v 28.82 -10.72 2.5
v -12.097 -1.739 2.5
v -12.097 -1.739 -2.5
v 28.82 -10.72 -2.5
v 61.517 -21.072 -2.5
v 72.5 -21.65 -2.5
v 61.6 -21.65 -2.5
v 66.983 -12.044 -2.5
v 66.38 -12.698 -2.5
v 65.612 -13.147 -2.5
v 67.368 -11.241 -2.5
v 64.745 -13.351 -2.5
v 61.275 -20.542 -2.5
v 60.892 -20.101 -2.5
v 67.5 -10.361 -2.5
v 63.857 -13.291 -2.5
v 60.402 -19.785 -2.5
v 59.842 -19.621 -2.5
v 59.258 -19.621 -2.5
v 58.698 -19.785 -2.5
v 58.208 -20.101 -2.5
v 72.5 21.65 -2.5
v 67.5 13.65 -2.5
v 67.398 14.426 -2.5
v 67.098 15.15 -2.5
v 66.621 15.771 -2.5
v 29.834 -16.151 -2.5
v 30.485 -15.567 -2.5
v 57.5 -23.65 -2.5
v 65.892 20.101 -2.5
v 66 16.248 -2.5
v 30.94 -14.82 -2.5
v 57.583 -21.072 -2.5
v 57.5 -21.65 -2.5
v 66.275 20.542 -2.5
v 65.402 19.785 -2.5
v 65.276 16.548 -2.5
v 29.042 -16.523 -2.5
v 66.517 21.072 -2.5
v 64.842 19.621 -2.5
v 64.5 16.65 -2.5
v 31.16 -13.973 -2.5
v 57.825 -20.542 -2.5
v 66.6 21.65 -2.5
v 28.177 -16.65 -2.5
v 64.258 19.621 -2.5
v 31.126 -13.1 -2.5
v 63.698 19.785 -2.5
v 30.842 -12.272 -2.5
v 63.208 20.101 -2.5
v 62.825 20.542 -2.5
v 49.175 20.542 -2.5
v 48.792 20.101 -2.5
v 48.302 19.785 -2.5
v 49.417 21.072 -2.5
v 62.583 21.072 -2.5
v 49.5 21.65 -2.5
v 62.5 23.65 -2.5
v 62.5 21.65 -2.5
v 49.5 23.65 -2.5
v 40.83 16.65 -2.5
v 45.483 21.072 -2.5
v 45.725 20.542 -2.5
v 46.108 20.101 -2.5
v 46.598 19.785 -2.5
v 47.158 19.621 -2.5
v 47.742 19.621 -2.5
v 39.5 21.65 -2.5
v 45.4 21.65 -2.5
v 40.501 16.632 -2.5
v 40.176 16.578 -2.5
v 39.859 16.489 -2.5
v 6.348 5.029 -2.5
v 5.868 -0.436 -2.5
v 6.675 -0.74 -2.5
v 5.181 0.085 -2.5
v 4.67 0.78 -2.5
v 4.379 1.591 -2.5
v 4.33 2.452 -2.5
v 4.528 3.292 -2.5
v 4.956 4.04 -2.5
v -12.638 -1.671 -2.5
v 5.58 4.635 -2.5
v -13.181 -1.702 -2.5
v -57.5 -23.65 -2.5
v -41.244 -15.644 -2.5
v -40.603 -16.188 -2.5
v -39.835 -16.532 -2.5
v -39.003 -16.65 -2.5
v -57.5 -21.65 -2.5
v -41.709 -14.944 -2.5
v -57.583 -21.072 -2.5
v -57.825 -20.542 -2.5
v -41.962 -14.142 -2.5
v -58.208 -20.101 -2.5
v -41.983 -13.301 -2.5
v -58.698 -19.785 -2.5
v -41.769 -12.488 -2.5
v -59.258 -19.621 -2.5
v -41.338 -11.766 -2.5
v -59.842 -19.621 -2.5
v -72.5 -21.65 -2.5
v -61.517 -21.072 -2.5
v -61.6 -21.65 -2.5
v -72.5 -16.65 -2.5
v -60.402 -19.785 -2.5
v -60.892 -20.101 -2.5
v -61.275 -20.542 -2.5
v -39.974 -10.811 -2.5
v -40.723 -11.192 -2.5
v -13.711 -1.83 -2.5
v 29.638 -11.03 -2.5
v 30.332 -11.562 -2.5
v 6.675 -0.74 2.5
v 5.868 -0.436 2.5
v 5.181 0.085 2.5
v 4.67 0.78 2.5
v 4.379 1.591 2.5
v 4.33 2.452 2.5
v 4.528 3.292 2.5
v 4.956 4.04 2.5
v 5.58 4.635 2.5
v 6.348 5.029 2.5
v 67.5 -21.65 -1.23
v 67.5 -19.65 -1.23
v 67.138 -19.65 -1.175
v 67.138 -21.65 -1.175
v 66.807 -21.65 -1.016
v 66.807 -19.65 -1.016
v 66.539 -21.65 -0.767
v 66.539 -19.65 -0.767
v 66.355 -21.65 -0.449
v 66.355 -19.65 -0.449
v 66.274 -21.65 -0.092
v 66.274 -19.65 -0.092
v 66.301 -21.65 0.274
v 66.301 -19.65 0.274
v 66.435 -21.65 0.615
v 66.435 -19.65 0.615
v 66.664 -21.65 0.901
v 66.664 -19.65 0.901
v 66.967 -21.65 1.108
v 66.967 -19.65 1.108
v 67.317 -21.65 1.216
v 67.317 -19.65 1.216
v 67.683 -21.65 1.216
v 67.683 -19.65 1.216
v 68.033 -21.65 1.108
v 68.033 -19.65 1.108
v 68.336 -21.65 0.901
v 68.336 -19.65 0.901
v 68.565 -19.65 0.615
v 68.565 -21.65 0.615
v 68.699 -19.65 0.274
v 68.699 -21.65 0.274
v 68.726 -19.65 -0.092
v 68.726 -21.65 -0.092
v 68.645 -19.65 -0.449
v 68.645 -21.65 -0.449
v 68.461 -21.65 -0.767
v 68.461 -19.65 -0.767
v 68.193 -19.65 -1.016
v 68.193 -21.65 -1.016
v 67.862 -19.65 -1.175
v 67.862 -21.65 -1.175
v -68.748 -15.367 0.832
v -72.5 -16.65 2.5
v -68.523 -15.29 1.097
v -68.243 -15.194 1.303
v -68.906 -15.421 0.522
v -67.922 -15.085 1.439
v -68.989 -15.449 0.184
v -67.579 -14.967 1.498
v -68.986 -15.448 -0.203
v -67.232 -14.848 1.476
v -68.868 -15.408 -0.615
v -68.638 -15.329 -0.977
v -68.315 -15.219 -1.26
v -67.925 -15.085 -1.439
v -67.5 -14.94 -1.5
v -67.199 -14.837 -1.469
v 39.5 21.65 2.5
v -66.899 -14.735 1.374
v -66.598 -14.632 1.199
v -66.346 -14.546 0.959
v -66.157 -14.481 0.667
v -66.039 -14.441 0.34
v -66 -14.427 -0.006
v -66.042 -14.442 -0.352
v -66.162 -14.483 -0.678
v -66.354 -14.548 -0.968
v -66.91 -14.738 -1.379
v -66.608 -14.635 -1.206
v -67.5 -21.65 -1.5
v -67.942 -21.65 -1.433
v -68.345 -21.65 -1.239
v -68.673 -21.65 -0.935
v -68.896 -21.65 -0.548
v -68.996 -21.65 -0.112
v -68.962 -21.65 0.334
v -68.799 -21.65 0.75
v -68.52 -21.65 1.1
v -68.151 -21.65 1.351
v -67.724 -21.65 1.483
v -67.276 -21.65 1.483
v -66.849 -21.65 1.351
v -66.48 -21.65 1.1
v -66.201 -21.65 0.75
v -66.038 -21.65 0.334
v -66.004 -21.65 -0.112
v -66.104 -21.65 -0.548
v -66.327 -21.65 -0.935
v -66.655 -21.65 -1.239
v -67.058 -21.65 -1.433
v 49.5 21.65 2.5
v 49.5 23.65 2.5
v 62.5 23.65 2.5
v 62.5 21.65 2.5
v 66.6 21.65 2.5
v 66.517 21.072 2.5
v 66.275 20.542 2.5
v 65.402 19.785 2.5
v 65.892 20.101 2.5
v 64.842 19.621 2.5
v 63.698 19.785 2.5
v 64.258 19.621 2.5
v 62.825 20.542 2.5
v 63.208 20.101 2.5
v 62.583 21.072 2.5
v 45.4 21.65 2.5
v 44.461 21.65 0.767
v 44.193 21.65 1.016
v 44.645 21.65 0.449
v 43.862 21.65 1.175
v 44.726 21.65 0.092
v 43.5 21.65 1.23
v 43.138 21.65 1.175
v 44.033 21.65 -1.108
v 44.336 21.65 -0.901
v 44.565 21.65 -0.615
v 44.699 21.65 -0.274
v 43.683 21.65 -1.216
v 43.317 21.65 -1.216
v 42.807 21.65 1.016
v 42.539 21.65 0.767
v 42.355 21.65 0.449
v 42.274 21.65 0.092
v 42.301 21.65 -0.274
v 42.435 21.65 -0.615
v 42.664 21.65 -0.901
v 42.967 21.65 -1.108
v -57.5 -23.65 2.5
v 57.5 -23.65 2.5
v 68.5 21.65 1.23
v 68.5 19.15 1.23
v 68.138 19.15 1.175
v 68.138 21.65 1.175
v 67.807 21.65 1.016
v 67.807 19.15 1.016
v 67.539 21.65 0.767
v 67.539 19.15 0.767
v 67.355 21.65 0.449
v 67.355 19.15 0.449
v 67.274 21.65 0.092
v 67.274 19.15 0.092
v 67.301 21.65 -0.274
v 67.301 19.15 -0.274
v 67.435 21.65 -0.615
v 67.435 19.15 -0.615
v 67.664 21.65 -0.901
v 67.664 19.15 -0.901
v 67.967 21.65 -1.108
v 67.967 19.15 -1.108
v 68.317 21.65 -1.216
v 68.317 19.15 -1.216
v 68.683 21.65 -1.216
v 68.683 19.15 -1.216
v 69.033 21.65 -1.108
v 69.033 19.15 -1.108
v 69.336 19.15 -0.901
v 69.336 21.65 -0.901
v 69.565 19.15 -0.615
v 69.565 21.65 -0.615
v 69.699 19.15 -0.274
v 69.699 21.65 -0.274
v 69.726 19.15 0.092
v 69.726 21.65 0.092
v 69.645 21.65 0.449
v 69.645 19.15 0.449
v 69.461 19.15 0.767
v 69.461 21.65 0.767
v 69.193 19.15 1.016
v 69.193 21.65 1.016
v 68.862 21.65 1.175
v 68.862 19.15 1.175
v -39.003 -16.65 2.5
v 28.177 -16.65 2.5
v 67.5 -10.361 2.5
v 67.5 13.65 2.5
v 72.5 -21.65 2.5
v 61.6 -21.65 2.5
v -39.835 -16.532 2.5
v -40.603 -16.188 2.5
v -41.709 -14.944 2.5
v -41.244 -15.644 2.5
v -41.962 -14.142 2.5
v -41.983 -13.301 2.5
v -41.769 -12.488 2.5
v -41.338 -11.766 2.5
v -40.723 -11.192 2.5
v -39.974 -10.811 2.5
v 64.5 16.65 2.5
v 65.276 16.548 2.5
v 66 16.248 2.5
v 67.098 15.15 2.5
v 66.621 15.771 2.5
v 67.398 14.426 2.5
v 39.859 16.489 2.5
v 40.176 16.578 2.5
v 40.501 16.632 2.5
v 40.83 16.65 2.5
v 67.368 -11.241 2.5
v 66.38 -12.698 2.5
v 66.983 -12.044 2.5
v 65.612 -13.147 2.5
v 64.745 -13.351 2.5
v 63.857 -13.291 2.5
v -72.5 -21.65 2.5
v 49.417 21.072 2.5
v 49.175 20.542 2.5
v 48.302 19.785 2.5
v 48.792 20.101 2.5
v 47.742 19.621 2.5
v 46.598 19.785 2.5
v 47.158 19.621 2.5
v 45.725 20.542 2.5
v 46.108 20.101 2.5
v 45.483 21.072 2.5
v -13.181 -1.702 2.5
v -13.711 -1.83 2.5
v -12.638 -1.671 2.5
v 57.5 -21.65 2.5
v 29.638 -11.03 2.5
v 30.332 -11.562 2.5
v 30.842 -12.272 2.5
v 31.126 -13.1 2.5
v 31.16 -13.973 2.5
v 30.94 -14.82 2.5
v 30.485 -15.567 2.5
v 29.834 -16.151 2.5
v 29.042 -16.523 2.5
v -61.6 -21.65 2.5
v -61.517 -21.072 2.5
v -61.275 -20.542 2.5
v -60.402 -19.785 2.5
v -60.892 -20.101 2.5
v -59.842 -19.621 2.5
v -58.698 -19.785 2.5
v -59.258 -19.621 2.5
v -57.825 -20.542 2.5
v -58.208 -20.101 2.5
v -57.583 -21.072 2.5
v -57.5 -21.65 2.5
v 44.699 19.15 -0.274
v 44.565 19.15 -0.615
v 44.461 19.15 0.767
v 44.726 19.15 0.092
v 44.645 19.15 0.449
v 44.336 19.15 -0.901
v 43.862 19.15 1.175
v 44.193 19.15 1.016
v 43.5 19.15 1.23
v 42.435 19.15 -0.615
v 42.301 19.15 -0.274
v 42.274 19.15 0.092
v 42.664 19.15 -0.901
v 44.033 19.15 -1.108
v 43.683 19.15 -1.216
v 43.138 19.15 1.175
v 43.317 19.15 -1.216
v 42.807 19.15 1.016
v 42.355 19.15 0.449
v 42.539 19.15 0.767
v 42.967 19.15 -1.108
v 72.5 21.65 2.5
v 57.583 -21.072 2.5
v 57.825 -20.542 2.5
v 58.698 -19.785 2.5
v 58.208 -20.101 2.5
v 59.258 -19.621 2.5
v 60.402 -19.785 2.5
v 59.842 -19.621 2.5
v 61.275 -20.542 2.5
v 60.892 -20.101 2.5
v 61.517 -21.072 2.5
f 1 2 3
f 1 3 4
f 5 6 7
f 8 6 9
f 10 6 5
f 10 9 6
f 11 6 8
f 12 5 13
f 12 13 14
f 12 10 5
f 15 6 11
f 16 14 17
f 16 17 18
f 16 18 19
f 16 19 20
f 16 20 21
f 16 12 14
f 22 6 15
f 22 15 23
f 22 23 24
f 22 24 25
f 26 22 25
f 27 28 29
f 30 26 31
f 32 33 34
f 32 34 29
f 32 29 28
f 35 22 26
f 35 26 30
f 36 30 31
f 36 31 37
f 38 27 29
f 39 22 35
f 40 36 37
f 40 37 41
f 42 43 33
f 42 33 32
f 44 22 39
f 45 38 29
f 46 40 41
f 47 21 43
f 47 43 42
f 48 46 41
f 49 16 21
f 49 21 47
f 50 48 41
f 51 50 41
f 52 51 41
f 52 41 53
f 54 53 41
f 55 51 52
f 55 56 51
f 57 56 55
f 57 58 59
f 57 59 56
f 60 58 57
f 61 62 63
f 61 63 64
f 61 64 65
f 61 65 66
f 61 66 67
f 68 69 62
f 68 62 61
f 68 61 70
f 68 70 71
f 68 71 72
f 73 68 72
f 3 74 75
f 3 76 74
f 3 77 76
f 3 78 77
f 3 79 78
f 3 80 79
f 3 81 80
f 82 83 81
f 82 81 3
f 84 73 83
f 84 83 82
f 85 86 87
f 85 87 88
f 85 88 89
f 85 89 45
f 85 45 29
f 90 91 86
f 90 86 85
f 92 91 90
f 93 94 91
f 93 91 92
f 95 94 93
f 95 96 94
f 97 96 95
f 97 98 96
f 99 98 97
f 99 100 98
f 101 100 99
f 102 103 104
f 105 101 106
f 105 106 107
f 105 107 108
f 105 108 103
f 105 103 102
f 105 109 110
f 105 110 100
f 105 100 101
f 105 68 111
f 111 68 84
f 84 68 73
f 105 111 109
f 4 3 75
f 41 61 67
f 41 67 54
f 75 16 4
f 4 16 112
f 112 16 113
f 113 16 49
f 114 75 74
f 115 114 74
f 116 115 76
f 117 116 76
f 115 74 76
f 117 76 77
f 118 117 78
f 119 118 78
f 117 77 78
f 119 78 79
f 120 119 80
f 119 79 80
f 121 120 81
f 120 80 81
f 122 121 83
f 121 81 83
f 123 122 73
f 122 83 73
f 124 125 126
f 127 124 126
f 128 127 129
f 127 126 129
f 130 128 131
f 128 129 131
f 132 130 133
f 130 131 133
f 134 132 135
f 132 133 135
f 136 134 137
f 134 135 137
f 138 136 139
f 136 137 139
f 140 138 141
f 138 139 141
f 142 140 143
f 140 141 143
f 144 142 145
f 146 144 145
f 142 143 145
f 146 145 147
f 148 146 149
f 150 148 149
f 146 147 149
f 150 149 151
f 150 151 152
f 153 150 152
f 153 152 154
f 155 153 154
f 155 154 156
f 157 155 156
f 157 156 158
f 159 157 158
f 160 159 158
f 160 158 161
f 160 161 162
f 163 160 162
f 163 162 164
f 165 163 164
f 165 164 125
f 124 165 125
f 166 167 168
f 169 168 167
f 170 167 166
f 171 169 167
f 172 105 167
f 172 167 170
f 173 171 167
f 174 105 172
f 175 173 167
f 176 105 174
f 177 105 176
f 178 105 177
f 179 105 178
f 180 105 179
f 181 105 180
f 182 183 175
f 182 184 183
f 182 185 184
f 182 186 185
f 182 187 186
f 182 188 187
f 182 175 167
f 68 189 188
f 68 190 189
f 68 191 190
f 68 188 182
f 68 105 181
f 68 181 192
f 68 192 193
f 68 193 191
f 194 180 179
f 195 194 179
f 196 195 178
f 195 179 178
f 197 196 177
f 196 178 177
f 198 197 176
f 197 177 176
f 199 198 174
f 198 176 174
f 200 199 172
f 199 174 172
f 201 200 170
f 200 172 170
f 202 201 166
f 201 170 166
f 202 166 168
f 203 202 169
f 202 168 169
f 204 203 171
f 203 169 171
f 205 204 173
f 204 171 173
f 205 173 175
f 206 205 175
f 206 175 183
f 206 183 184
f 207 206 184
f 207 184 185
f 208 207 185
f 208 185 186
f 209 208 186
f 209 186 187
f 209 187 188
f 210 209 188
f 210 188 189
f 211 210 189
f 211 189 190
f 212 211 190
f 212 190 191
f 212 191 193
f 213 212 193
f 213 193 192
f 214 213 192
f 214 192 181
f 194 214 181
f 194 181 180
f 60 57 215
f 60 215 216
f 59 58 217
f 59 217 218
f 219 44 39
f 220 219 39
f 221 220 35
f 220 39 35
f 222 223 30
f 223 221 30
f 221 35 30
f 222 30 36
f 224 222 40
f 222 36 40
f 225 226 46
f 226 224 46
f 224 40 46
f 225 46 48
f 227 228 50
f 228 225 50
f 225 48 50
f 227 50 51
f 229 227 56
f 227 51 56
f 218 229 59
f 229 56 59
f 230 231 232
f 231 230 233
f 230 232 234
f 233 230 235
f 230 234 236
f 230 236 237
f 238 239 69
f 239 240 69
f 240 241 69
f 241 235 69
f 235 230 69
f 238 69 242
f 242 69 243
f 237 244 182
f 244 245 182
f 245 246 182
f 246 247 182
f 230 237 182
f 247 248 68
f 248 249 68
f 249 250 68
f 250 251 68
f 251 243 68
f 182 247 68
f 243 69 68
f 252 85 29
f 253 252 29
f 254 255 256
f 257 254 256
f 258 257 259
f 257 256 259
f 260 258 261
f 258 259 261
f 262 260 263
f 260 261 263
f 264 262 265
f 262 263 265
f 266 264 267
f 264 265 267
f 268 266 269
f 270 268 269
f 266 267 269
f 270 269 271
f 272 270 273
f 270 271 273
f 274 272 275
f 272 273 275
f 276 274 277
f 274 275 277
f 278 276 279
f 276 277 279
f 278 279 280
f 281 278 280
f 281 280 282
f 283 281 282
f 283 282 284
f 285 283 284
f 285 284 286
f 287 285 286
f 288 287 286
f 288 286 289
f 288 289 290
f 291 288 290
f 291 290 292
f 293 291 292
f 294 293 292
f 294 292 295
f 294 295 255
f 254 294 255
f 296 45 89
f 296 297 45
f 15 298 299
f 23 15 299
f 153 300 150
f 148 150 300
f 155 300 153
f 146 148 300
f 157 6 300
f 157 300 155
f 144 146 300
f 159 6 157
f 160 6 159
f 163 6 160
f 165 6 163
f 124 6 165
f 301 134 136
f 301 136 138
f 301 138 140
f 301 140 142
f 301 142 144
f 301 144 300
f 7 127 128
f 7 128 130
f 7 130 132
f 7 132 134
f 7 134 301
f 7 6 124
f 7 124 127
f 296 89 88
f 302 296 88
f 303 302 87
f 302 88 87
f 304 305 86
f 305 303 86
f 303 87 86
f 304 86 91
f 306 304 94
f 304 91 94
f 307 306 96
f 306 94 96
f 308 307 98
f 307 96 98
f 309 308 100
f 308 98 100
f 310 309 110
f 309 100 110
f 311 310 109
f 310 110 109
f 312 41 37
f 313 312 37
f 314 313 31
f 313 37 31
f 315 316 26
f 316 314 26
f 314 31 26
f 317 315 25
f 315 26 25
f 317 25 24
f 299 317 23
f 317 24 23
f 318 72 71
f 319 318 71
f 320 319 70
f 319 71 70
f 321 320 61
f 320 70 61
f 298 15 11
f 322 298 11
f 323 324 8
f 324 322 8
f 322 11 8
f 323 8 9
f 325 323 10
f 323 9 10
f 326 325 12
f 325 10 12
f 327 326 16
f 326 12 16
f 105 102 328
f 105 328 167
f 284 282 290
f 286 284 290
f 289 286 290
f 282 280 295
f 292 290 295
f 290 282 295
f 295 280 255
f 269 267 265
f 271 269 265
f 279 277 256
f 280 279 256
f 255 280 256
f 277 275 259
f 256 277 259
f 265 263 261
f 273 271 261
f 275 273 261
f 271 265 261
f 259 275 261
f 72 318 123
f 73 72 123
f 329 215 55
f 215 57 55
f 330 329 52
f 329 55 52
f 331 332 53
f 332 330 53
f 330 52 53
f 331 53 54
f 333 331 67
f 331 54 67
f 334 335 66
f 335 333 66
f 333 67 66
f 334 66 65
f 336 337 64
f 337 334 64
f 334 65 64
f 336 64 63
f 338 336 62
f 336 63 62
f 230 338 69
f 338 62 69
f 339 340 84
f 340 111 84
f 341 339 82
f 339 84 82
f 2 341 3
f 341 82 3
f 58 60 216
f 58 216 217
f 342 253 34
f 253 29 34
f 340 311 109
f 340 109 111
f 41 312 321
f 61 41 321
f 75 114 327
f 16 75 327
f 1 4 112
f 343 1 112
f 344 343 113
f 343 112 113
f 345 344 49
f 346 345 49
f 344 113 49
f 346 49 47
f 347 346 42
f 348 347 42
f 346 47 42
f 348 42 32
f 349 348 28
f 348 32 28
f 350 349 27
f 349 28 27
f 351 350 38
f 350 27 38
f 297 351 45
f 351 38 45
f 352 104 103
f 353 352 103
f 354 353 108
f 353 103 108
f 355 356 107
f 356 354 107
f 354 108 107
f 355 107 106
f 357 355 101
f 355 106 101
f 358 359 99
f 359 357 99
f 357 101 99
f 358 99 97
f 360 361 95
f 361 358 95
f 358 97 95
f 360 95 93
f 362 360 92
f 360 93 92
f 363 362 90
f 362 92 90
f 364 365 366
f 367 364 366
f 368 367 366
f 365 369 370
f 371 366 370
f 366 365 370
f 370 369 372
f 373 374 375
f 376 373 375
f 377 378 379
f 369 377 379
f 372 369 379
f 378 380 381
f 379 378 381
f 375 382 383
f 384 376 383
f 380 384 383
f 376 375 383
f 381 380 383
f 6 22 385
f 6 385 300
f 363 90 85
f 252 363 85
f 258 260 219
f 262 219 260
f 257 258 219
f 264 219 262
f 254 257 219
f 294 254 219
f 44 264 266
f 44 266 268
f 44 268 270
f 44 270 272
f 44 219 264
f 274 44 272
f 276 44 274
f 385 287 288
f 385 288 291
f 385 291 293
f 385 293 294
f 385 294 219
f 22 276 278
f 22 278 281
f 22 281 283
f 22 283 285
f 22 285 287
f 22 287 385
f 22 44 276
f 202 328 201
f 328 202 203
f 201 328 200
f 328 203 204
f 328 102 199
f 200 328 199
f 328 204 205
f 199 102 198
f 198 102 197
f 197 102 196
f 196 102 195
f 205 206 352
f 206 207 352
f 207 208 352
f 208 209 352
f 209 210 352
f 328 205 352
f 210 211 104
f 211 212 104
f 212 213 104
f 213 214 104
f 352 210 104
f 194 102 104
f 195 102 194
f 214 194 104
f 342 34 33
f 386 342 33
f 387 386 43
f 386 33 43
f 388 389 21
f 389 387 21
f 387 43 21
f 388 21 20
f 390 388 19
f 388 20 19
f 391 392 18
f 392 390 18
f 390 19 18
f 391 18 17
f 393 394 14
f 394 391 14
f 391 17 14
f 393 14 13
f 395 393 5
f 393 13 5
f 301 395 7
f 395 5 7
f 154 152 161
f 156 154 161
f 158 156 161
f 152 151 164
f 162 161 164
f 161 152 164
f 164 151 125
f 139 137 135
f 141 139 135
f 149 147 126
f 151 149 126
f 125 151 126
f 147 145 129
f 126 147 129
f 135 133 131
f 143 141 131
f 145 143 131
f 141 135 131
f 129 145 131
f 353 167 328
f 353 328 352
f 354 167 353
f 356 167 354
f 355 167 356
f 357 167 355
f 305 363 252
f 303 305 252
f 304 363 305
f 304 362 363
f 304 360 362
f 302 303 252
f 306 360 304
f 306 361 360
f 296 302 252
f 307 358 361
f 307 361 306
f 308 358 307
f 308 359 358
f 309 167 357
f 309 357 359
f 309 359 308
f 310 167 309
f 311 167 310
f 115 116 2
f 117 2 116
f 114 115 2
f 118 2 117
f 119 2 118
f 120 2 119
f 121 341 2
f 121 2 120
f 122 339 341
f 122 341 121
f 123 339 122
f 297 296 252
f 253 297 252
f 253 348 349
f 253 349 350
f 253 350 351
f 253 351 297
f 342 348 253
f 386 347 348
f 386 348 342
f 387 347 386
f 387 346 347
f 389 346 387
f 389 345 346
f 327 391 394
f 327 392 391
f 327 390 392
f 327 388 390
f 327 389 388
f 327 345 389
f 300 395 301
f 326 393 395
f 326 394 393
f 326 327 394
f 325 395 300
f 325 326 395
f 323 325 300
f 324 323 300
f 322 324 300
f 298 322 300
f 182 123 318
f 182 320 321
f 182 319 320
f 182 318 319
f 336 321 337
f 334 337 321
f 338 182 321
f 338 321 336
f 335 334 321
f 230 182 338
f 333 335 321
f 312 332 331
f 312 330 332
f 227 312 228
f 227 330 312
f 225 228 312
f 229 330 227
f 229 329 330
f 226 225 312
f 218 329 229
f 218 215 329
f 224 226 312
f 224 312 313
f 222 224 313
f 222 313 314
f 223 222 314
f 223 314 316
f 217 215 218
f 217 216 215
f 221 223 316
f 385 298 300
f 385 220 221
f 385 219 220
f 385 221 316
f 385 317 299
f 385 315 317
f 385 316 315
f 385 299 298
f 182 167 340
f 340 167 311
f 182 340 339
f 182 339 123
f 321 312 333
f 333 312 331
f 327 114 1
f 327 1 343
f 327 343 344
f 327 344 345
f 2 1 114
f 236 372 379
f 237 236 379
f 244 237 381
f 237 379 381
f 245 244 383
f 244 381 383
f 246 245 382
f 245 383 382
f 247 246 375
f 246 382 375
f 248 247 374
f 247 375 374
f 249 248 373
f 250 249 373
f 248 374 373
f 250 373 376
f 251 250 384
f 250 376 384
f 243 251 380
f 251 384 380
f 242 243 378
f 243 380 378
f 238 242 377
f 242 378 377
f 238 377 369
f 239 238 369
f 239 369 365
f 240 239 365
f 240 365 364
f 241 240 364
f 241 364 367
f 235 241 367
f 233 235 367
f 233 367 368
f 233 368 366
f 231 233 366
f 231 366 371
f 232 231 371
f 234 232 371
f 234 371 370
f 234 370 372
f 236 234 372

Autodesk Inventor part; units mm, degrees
ref_plane "YZ Plane" through (0, 0, 0) normal (1, 0, 0) x (0, 1, 0)
ref_plane "XZ Plane" through (0, 0, 0) normal (0, 1, 0) x (-1, 0, 0)
ref_plane "XY Plane" through (0, 0, 0) normal (0, 0, 1) x (1, 0, 0)
sketch "スケッチ1" plane through (0, 0, 0) normal (0, 0, 1) x (1, 0, 0)
  line L0 (-72.5, -21.65) -> (72.5, -21.65) construction
  line L1 (72.5, -21.65) -> (72.5, 21.65) construction
  line L2 (72.5, 21.65) -> (-72.5, 21.65) construction
  line L3 (-72.5, 21.65) -> (-72.5, -21.65) construction
  line L4 (-72.5, -21.65) -> (72.5, 21.65) construction
  line L5 (72.5, -21.65) -> (-72.5, 21.65) construction
  line L6 (-67.5, 21.65) -> (-67.5, -21.65) construction
  line L7 (0, 0) -> (0, 21.65) construction
  line L8 (0, 0) -> (-72.5, 0) construction
  line L9 (67.5, 21.65) -> (67.5, -21.65) construction
  line L10 (-72.5, -21.65) -> (-61.6, -21.65)
  line L11 (49.5, 21.65) -> (49.5, 23.65)
  line L12 (49.5, 23.65) -> (62.5, 23.65)
  line L13 (62.5, 23.65) -> (62.5, 21.65)
  line L14 (66.6, 21.65) -> (72.5, 21.65)
  line L15 (72.5, 21.65) -> (72.5, -21.65)
  line L16 (72.5, -21.65) -> (61.6, -21.65)
  line L17 (-57.5, -21.65) -> (-57.5, -23.65)
  line L18 (-57.5, -23.65) -> (57.5, -23.65)
  line L19 (57.5, -23.65) -> (57.5, -21.65)
  arc A0 (45.4, 21.65) -> (49.5, 21.65) centre (47.45, 21.65) ccw
  arc A1 (62.5, 21.65) -> (66.6, 21.65) centre (64.55, 21.65) ccw
  arc A2 (-57.5, -21.65) -> (-61.6, -21.65) centre (-59.55, -21.65) ccw
  arc A3 (61.6, -21.65) -> (57.5, -21.65) centre (59.55, -21.65) ccw
  line L20 (-72.5, -21.65) -> (-72.5, -16.65)
  line L21 (-72.5, -16.65) -> (39.5, 21.65)
  line L22 (45.4, 21.65) -> (39.5, 21.65)
  line L23 (66.95, 24.476) -> (70.05, 24.476) construction
  line L24 (70.05, 24.476) -> (70.05, 13.3235) construction
  line L25 (70.05, 13.3235) -> (66.95, 13.3235) construction
  line L26 (66.95, 13.3235) -> (66.95, 24.476) construction
  line L27 (68.5, 24.476) -> (68.5, 13.3235) construction
  line L28 (41.95, 24.476) -> (45.05, 24.476) construction
  line L29 (45.05, 24.476) -> (45.05, 13.9945) construction
  line L30 (45.05, 13.9945) -> (41.95, 13.9945) construction
  line L31 (41.95, 13.9945) -> (41.95, 24.476) construction
  line L32 (43.5, 24.476) -> (43.5, 13.9945) construction
  dimension "d16" = 5
  dimension "d20" = 43.3
  dimension "d40" = 135
  dimension "d41" = 10
  dimension "d42" = 2.05
  dimension "d43" = 2
  dimension "d44" = 5
  dimension "d45" = 10
  dimension "d46" = 10
  dimension "d48" = 3.1
  dimension "d50" = 4
  dimension "d51" = 25
  dimension "d52" = 3.1
  dimension "d62" = 6
  dimension "d63" = 6
extrude "押し出し1" add sketch "スケッチ1" along normal blind 2.5
mirror "ミラー1" about plane through (8.3734, -6.8299, 0) normal (0, 0, -1) of "押し出し1"
sketch "スケッチ2" plane through (-72.5, -21.65, 2.5) normal (0, -1, 0) x (1, 0, 0)
  line L0 (0, -5) -> (0, 0)
  line L1 (15, -5) -> (130, -5) construction
  line L2 (72.5, -5) -> (72.5, 0) construction
  line L3 (15, 0) -> (130, 0) construction
  point P0 (72.5, -2.5)
  point P1 (140, -2.5)
  point P2 (0, -2.5)
hole "穴1" at (67.5, -21.65, 0) direction (0, 1, 0) diameter 2.459 depth 2 thread size "M3x0.5" class "6H" standard "ISO Metric profile"
sketch "スケッチ4" plane through (66.6, 21.65, 2.5) normal (0, 1, 0) x (1, 0, 0)
  line L0 (5.9, 5) -> (5.9, 0) projected
  point P0 (-66.6, 2.5)
  point P1 (1.9, 2.5)
  point P2 (-23.1, 2.5)
  point P3 (5.9, 2.5)
  dimension "d53" = 4
  dimension "d54" = 25
hole "穴2" at (68.5, 21.65, 0) at (43.5, 21.65, 0) direction (0, -1, 0) diameter 2.459 depth 2.5 thread size "M3x0.5" class "6H" standard "ISO Metric profile"
sketch "スケッチ6" plane through (0, 0, 2.5) normal (0, 0, 1) x (1, 0, 0)
  line L0 (61.6, -21.65) -> (72.5, -21.65) projected
  line L1 (72.5, -21.65) -> (72.5, 21.65) projected
  line L2 (72.5, 21.65) -> (66.6, 21.65) projected
  line L3 (39.5, 21.65) -> (-72.5, -16.65) projected
  line L4 (67.5, 16.65) -> (67.5, -16.65) construction
  line L5 (67.5, -16.65) -> (-57.0473, -16.65) construction
  line L6 (-57.0473, -16.65) -> (40.3313, 16.65) construction
  line L7 (40.3313, 16.65) -> (67.5, 16.65) construction
  line L8 (67.5, -16.65) -> (-8.358, 0) construction
  line L9 (67.5, -14.0905) -> (67.5, 16.65)
  line L10 (67.5, 16.65) -> (40.3313, 16.65)
  line L11 (40.3313, 16.65) -> (-3.7993, 1.5589)
  line L12 (-3.7993, 1.5589) -> (67.5, -14.0905)
  line L13 (55.8388, -16.65) -> (-57.0473, -16.65)
  line L14 (-57.0473, -16.65) -> (-12.9167, -1.5589)
  line L15 (-12.9167, -1.5589) -> (55.8388, -16.65)
  point P0 (0, 0)
  dimension "d72" = 5
  dimension "d73" = 5
  dimension "d74" = 5
  dimension "d75" = 5
  dimension "d76" = 5
extrude "押し出し4" cut sketch "スケッチ6" against normal blind 10
fillet "フィレット3" radius 3 7 edges at (-3.7993, 1.5589, 0) (40.3313, 16.65, 0) (67.5, -14.0905, 0) (55.8388, -16.65, 0) (-12.9167, -1.5589, 0) (-57.0473, -16.65, 0) (67.5, 16.65, 0)
sketch "スケッチ7" plane through (-72.5, -21.65, 2.5) normal (0, -1, 0) x (1, 0, 0)
  line L0 (0, 0) -> (0, -5) projected
  line L1 (15, 0) -> (130, 0) projected
  line L2 (15, -5) -> (130, -5) projected
  line L3 (0, -2.5) -> (5, -2.5)
  point P0 (72.5, -2.5)
  dimension "d80" = 5
hole "穴3" at (-67.5, -21.65, 0) direction (0, 1, 0) diameter 3 end through all
equation "\"d16\" = d4"
equation "\"d40\" = d6"
equation "\"d41\" = d3"
equation "\"d46\" = d45"
equation "\"d63\" = d62"
equation "\"d53\" = d50"
equation "\"d54\" = d51"
equation "\"d73\" = d72"
equation "\"d74\" = d73"
equation "\"d75\" = d74"
equation "\"d76\" = d74"
equation "\"d4\" = 5"
equation "\"d6\" = 135"
equation "\"d3\" = 10"
properties part number "前腕_サブフレーム_1_1" material "アセタール樹脂、黒"
